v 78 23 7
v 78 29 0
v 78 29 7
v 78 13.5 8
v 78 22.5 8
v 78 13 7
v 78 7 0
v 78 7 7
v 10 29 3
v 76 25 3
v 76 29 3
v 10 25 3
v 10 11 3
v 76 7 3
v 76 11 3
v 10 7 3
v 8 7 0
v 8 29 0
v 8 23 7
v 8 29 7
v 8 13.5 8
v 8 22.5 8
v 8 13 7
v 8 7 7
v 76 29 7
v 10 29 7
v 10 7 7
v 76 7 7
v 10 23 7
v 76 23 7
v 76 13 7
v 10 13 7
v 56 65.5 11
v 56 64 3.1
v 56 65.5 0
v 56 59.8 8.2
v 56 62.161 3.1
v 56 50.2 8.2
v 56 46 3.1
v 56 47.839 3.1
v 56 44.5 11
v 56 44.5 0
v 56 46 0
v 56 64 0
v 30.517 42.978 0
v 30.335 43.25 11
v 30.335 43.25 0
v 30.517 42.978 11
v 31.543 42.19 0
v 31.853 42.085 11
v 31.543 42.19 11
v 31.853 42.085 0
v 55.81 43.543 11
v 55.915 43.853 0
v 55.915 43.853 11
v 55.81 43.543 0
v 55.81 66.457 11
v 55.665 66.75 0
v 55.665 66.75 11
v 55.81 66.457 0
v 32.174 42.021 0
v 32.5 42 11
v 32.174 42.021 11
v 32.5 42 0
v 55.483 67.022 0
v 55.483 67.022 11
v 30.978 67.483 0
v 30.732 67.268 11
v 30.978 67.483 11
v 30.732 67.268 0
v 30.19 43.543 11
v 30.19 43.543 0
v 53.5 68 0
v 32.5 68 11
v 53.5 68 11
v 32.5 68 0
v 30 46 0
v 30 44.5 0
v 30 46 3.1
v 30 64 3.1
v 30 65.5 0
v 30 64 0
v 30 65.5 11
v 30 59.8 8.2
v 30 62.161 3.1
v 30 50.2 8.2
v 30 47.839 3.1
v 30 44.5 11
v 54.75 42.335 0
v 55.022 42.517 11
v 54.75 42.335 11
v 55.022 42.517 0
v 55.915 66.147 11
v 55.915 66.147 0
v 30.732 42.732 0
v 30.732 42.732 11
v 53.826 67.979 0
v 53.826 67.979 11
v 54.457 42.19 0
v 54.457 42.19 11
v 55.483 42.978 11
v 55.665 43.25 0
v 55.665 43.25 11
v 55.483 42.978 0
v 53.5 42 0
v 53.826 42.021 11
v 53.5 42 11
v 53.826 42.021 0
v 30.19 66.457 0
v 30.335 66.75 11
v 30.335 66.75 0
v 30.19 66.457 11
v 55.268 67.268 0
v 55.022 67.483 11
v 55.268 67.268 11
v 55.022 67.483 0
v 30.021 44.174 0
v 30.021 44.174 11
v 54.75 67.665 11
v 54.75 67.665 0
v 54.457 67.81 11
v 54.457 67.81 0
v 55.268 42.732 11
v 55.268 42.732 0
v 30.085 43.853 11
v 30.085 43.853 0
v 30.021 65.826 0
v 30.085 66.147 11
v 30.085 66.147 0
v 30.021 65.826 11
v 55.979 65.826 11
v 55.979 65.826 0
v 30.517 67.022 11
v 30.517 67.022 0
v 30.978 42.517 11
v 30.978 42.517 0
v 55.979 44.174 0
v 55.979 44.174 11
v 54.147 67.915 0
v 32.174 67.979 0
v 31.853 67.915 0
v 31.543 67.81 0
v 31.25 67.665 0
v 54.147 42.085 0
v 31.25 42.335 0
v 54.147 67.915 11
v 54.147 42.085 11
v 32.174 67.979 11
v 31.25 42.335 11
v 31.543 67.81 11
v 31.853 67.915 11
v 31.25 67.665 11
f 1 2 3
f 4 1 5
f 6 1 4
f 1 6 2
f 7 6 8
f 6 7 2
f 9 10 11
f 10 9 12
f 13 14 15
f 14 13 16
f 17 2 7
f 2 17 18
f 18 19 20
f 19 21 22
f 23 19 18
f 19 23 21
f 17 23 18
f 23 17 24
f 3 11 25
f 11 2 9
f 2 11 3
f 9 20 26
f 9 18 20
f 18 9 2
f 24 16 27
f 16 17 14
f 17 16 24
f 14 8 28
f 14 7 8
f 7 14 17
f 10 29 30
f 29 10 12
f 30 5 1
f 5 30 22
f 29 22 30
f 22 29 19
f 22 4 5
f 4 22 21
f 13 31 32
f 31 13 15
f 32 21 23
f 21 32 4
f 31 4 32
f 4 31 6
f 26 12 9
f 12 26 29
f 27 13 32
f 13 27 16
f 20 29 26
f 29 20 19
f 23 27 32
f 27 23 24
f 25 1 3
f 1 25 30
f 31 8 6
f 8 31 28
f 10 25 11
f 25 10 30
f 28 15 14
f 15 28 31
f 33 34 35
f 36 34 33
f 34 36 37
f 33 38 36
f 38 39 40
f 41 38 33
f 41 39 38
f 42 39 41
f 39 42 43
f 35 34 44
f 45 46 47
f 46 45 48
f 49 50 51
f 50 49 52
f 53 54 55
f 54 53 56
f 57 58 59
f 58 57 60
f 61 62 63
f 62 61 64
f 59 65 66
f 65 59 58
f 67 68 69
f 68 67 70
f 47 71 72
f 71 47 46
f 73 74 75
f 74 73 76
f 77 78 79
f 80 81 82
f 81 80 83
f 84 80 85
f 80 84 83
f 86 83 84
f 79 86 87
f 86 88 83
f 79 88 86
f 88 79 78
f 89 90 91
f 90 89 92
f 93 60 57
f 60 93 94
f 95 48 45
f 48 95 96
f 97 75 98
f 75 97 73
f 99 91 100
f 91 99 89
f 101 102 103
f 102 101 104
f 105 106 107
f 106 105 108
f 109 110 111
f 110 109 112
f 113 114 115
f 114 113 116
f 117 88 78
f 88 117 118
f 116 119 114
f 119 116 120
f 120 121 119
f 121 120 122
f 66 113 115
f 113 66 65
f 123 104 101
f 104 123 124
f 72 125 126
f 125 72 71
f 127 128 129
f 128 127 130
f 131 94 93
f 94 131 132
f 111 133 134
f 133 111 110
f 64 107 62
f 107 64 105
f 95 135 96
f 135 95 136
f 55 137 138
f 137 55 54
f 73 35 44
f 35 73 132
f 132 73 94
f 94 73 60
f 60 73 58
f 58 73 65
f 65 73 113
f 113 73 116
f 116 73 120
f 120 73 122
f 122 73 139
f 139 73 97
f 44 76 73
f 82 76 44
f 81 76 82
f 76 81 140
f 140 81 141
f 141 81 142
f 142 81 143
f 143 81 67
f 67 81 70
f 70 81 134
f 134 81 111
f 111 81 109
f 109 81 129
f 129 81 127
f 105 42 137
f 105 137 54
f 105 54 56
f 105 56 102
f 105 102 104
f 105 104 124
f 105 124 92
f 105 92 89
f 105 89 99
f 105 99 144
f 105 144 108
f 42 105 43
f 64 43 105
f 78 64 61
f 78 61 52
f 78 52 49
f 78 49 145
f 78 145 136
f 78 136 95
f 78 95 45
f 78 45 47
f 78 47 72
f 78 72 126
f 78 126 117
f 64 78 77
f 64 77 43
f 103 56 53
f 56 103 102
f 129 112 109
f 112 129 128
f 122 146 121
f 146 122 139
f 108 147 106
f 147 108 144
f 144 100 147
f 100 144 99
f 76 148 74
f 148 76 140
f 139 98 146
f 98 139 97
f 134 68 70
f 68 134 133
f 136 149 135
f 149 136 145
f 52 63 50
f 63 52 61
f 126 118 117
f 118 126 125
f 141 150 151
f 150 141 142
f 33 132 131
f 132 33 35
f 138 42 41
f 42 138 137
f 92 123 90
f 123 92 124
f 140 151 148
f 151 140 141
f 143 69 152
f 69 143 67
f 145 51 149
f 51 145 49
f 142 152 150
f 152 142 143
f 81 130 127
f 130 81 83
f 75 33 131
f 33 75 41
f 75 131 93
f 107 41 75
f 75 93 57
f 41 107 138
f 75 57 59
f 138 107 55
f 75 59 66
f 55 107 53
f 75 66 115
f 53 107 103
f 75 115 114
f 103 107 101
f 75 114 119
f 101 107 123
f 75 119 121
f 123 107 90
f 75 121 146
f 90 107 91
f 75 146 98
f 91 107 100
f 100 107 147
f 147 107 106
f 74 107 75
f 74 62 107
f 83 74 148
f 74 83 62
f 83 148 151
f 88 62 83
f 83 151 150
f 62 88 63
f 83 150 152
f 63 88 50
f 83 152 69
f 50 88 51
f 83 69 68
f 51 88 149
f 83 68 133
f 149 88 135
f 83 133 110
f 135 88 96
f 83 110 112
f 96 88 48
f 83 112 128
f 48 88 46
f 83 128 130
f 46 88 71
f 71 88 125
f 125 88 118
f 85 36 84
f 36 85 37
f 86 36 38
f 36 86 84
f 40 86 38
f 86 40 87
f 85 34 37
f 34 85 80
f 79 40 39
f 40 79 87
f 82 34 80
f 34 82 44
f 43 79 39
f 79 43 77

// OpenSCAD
/*
Sample 086: Schwalbenschwanz-Linearführung — 0,30 mm
Generated from the FDM Mechanical Sample Library.
Units: millimetres.

Override examples:
  openscad -o custom.stl -D 'view="plate"' -D 'render_fn=64' model.scad
  openscad -o preview.png -D 'view="assembly"' model.scad
*/
use <../../../library/fdm_mechanisms.scad>

render_fn = is_undef(render_fn) ? 48 : render_fn;
view = is_undef(view) ? "plate" : view;
$fn = render_fn;

sample_dovetail_rail(
    view=view,
    clearance=0.3,
    length=70,
    carriage_l=26
);
